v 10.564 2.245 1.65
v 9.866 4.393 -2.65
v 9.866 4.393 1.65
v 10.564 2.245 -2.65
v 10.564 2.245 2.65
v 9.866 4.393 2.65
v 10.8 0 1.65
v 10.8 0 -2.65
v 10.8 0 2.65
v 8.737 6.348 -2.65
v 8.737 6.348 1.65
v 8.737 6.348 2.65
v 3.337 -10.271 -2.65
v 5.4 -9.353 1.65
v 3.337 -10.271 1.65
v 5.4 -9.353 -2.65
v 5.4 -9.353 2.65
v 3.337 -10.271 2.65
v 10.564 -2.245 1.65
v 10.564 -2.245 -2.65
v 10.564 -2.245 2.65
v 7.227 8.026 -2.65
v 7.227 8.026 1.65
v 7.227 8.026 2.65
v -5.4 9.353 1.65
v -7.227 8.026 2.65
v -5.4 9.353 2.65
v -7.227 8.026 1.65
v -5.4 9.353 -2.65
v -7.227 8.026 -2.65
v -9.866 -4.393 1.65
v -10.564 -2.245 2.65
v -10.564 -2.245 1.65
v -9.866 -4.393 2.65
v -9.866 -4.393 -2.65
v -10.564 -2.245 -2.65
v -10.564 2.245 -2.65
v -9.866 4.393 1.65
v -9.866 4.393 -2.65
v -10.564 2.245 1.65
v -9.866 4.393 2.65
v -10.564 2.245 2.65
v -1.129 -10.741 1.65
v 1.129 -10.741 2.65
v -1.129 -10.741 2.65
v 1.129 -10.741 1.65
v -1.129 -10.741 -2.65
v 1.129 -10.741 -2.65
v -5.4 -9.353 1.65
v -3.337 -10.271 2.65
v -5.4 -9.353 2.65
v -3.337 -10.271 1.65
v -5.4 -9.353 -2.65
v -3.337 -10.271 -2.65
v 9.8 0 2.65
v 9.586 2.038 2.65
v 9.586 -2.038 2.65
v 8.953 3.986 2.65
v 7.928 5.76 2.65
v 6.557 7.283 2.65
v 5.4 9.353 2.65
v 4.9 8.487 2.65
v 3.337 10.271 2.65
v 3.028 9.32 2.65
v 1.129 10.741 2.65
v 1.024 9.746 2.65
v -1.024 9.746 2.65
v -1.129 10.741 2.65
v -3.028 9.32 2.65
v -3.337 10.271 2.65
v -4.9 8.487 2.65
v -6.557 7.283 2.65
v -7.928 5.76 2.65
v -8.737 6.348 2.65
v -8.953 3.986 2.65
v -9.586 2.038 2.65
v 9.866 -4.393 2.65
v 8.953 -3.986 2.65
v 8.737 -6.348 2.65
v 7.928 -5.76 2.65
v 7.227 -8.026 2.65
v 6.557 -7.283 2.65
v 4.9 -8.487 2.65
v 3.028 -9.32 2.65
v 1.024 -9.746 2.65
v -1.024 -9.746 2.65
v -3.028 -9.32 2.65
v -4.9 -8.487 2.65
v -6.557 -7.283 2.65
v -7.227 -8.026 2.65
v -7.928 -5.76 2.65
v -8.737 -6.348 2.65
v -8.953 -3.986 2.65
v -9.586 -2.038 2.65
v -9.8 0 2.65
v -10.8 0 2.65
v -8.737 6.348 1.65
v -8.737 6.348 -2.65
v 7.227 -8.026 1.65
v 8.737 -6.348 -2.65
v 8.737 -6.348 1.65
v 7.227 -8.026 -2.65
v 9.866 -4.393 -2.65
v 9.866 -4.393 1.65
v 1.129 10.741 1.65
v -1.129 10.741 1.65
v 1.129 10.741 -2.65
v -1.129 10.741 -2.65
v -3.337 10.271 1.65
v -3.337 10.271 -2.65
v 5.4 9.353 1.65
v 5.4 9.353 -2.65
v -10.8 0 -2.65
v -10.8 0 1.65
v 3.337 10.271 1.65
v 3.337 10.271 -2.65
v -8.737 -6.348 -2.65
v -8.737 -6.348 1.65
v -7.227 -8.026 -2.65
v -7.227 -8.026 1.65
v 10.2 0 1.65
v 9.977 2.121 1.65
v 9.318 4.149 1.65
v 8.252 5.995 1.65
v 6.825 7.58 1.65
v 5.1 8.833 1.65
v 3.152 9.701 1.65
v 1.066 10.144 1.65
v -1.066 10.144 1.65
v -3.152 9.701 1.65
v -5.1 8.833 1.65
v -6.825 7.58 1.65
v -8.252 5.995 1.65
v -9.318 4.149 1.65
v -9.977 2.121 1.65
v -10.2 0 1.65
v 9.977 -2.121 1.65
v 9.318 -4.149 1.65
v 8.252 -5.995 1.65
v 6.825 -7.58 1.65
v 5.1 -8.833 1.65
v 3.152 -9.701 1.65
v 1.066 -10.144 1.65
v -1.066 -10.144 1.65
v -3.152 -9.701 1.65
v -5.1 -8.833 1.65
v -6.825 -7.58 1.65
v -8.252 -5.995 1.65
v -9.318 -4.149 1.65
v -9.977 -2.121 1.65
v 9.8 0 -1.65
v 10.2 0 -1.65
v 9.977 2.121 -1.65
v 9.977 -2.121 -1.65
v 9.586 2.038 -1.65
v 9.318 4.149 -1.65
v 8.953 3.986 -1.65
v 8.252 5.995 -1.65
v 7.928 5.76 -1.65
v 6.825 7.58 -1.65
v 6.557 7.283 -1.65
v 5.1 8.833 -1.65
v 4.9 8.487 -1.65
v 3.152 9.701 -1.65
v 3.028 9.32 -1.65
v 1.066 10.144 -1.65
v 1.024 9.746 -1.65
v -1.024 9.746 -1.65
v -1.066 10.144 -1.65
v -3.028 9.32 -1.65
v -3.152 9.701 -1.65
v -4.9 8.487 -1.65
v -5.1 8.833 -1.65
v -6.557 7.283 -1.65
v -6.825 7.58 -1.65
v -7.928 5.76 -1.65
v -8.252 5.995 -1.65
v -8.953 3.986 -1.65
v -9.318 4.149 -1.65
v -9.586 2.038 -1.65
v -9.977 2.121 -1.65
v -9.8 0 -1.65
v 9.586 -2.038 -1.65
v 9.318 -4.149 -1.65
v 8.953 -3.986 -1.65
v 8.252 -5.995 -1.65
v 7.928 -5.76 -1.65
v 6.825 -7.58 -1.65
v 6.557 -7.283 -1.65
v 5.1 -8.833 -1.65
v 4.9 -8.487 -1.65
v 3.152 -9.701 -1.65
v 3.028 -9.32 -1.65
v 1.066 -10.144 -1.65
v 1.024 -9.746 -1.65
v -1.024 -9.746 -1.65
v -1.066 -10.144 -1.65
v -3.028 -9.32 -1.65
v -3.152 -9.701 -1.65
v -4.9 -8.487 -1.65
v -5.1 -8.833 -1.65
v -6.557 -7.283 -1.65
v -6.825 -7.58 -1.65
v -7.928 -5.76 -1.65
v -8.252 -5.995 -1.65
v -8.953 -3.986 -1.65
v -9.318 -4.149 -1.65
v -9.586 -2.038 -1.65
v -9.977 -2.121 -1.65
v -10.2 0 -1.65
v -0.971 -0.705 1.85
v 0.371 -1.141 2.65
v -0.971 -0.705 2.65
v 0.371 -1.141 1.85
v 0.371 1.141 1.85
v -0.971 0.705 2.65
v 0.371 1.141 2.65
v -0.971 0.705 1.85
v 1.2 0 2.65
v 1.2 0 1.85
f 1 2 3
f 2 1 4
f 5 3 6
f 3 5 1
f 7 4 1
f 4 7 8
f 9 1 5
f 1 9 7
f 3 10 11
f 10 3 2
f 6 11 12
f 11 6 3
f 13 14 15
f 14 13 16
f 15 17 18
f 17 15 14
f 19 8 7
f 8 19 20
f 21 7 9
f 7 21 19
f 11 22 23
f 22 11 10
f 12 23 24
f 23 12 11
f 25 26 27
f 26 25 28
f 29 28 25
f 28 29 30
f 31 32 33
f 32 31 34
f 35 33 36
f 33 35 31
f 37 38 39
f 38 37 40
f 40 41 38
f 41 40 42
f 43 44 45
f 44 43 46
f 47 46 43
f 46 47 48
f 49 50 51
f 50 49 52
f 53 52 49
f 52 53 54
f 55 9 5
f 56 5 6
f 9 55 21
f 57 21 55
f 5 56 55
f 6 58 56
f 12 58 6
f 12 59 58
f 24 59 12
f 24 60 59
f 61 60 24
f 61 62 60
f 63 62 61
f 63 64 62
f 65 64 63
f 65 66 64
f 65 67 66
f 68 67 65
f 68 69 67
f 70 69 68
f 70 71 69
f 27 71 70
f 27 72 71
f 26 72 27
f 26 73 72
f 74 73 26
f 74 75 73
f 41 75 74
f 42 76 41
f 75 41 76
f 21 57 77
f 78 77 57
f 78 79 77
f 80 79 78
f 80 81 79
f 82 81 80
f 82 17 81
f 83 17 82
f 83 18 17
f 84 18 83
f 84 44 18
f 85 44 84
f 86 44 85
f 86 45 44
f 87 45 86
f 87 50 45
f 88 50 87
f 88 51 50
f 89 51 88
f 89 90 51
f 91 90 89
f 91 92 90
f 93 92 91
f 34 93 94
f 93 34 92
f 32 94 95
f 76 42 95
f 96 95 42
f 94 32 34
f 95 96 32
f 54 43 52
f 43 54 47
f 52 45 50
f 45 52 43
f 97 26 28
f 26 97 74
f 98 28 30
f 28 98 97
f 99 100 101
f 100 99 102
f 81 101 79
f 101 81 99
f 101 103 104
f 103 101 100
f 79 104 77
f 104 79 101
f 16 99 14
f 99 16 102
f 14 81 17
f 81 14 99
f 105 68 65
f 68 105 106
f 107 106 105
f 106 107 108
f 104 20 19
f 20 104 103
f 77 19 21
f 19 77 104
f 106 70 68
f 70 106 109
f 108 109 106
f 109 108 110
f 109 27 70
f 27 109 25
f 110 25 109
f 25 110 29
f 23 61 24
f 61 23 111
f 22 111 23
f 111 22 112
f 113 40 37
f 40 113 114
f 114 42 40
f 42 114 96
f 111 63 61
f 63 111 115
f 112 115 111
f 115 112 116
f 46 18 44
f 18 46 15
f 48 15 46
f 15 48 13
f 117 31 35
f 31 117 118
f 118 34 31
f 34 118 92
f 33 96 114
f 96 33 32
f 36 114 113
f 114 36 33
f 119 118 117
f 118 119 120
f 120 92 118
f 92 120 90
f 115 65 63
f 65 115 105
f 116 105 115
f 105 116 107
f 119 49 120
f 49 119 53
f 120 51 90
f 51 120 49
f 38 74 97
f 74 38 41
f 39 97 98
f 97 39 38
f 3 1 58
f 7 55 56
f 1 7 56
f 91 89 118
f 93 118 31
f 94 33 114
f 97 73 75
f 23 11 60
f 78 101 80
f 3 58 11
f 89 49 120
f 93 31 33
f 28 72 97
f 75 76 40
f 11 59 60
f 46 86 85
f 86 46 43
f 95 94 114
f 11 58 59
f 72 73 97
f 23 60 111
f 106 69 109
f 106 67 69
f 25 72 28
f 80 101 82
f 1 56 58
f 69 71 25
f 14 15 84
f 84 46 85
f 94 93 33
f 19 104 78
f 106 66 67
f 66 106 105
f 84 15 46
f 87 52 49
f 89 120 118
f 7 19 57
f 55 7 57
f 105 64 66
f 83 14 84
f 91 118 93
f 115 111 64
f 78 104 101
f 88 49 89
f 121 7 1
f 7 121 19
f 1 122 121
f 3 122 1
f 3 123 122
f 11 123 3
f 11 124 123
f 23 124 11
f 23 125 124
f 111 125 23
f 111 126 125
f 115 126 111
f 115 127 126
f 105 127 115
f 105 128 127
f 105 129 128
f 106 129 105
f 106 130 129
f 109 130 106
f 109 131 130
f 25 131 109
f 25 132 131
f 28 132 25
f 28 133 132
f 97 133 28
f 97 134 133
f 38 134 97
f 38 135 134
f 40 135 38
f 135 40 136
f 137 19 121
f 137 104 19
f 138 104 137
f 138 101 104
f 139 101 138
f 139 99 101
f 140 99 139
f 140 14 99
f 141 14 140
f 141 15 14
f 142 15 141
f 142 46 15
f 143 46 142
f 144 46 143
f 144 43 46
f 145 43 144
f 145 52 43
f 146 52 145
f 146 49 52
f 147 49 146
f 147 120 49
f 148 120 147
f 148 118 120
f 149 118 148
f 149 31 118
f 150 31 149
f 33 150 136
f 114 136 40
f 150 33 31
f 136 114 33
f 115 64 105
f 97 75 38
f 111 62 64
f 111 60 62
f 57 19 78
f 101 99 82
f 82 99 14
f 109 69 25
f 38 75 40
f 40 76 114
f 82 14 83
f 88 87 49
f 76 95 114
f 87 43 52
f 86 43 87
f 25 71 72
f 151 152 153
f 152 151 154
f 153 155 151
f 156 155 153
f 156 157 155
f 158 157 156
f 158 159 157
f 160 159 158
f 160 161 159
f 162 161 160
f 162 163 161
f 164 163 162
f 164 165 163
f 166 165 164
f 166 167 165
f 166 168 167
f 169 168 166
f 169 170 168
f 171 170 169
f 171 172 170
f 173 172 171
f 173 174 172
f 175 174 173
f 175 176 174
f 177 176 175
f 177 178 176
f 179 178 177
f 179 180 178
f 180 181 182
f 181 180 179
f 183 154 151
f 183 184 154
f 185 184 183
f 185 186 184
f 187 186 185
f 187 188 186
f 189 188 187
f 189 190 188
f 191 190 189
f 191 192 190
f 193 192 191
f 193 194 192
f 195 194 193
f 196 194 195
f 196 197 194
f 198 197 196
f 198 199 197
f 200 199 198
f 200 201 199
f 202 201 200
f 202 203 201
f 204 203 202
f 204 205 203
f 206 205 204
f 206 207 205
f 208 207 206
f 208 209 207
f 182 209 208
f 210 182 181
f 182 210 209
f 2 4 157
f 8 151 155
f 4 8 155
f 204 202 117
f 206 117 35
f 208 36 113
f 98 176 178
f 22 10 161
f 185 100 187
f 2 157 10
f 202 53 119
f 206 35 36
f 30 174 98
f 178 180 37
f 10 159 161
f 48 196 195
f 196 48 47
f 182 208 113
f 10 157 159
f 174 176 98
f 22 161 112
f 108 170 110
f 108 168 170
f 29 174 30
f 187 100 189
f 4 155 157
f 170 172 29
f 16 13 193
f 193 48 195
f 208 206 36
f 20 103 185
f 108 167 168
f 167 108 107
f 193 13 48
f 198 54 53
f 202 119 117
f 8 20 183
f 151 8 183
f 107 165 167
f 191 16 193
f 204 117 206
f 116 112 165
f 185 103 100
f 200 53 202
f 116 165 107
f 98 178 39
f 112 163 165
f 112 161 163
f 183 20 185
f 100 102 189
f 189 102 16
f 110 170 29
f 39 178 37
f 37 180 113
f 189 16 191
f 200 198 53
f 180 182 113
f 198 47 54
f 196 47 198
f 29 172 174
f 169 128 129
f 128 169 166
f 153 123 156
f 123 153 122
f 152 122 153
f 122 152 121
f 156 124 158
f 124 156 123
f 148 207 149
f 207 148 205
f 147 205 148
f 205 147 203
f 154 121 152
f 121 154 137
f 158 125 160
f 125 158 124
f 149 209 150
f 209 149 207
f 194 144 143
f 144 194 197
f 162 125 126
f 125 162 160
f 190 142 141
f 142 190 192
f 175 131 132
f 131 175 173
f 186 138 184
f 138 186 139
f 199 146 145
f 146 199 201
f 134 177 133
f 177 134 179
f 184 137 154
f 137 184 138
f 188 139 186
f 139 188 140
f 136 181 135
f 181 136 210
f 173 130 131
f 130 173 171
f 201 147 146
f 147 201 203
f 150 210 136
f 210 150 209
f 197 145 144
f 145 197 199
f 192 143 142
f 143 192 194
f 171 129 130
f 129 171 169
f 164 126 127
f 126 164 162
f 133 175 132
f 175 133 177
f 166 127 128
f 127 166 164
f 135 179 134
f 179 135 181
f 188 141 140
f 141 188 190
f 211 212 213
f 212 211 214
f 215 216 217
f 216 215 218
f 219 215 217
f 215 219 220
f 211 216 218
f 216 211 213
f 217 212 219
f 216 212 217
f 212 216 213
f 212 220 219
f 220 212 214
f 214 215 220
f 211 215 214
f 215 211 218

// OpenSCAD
// Parameters
outer_radius = 10.8; //[5.4:21.6:0.1]
inner_radius = 6.0; //[2.0:10.0:0.1]
height = 5.3; //[2.65:10.6:0.1]
edge_feature_size = 1.0; //[0.5:2.0:0.1]
overlap = 0.8; //[0.5:2.0:0.1]
center_mark_radius = 1.2; //[0.6:2.4:0.1]
center_mark_height = 0.8; //[0.4:1.6:0.1]
mount_hole_count = 4; //[3:8:1]
mount_hole_radius = 1.0; //[0.6:2.0:0.1]
mount_hole_circle_radius = 8.0; //[4.0:16.0:0.1]
groove_count = 3; //[1:6:1]
groove_width = 0.8; //[0.4:1.6:0.1]
groove_depth = 0.6; //[0.3:1.2:0.1]

// Base Shapes
module outer_cylinder() {
  cylinder(h=height, r=outer_radius, center=true);
}

module inner_bore() {
  cylinder(h=height + 2*overlap, r=inner_radius, center=true);
}

module edge_chamfer_top() {
  translate([0, 0, height/2 - edge_feature_size/2])
    cylinder(h=edge_feature_size, r1=outer_radius, r2=outer_radius - edge_feature_size, center=true);
}

module edge_chamfer_bottom() {
  translate([0, 0, -height/2 + edge_feature_size/2])
    cylinder(h=edge_feature_size, r1=outer_radius, r2=outer_radius - edge_feature_size, center=true);
}

module center_mark() {
  translate([0, 0, height/2 + center_mark_height/2 - overlap])
    cylinder(h=center_mark_height, r=center_mark_radius, center=true);
}

module mount_hole(angle) {
  translate([mount_hole_circle_radius*cos(angle), mount_hole_circle_radius*sin(angle), 0])
    cylinder(h=height + 2*overlap, r=mount_hole_radius, center=true);
}

module groove_cut(radius_offset) {
  cylinder(h=height - 2*edge_feature_size, r=outer_radius - groove_depth - radius_offset, center=true);
}

// Operations
module main_body() {
  difference() {
    outer_cylinder();
    inner_bore();
  }
}

module edge_round_or_chamfer() {
  difference() {
    main_body();
    edge_chamfer_top();
    edge_chamfer_bottom();
  }
}

module decorative_grooves() {
  difference() {
    edge_round_or_chamfer();
    for (i = [0:groove_count-1]) {
      groove_cut(i * groove_width * 1.5);
    }
  }
}

module mounting_holes() {
  difference() {
    decorative_grooves();
    for (i = [0:mount_hole_count-1]) {
      mount_hole(i * 360/mount_hole_count);
    }
  }
}

// Final Model
module complete_model() {
  union() {
    mounting_holes();
    center_mark();
  }
}

// Render the complete model
complete_model();
